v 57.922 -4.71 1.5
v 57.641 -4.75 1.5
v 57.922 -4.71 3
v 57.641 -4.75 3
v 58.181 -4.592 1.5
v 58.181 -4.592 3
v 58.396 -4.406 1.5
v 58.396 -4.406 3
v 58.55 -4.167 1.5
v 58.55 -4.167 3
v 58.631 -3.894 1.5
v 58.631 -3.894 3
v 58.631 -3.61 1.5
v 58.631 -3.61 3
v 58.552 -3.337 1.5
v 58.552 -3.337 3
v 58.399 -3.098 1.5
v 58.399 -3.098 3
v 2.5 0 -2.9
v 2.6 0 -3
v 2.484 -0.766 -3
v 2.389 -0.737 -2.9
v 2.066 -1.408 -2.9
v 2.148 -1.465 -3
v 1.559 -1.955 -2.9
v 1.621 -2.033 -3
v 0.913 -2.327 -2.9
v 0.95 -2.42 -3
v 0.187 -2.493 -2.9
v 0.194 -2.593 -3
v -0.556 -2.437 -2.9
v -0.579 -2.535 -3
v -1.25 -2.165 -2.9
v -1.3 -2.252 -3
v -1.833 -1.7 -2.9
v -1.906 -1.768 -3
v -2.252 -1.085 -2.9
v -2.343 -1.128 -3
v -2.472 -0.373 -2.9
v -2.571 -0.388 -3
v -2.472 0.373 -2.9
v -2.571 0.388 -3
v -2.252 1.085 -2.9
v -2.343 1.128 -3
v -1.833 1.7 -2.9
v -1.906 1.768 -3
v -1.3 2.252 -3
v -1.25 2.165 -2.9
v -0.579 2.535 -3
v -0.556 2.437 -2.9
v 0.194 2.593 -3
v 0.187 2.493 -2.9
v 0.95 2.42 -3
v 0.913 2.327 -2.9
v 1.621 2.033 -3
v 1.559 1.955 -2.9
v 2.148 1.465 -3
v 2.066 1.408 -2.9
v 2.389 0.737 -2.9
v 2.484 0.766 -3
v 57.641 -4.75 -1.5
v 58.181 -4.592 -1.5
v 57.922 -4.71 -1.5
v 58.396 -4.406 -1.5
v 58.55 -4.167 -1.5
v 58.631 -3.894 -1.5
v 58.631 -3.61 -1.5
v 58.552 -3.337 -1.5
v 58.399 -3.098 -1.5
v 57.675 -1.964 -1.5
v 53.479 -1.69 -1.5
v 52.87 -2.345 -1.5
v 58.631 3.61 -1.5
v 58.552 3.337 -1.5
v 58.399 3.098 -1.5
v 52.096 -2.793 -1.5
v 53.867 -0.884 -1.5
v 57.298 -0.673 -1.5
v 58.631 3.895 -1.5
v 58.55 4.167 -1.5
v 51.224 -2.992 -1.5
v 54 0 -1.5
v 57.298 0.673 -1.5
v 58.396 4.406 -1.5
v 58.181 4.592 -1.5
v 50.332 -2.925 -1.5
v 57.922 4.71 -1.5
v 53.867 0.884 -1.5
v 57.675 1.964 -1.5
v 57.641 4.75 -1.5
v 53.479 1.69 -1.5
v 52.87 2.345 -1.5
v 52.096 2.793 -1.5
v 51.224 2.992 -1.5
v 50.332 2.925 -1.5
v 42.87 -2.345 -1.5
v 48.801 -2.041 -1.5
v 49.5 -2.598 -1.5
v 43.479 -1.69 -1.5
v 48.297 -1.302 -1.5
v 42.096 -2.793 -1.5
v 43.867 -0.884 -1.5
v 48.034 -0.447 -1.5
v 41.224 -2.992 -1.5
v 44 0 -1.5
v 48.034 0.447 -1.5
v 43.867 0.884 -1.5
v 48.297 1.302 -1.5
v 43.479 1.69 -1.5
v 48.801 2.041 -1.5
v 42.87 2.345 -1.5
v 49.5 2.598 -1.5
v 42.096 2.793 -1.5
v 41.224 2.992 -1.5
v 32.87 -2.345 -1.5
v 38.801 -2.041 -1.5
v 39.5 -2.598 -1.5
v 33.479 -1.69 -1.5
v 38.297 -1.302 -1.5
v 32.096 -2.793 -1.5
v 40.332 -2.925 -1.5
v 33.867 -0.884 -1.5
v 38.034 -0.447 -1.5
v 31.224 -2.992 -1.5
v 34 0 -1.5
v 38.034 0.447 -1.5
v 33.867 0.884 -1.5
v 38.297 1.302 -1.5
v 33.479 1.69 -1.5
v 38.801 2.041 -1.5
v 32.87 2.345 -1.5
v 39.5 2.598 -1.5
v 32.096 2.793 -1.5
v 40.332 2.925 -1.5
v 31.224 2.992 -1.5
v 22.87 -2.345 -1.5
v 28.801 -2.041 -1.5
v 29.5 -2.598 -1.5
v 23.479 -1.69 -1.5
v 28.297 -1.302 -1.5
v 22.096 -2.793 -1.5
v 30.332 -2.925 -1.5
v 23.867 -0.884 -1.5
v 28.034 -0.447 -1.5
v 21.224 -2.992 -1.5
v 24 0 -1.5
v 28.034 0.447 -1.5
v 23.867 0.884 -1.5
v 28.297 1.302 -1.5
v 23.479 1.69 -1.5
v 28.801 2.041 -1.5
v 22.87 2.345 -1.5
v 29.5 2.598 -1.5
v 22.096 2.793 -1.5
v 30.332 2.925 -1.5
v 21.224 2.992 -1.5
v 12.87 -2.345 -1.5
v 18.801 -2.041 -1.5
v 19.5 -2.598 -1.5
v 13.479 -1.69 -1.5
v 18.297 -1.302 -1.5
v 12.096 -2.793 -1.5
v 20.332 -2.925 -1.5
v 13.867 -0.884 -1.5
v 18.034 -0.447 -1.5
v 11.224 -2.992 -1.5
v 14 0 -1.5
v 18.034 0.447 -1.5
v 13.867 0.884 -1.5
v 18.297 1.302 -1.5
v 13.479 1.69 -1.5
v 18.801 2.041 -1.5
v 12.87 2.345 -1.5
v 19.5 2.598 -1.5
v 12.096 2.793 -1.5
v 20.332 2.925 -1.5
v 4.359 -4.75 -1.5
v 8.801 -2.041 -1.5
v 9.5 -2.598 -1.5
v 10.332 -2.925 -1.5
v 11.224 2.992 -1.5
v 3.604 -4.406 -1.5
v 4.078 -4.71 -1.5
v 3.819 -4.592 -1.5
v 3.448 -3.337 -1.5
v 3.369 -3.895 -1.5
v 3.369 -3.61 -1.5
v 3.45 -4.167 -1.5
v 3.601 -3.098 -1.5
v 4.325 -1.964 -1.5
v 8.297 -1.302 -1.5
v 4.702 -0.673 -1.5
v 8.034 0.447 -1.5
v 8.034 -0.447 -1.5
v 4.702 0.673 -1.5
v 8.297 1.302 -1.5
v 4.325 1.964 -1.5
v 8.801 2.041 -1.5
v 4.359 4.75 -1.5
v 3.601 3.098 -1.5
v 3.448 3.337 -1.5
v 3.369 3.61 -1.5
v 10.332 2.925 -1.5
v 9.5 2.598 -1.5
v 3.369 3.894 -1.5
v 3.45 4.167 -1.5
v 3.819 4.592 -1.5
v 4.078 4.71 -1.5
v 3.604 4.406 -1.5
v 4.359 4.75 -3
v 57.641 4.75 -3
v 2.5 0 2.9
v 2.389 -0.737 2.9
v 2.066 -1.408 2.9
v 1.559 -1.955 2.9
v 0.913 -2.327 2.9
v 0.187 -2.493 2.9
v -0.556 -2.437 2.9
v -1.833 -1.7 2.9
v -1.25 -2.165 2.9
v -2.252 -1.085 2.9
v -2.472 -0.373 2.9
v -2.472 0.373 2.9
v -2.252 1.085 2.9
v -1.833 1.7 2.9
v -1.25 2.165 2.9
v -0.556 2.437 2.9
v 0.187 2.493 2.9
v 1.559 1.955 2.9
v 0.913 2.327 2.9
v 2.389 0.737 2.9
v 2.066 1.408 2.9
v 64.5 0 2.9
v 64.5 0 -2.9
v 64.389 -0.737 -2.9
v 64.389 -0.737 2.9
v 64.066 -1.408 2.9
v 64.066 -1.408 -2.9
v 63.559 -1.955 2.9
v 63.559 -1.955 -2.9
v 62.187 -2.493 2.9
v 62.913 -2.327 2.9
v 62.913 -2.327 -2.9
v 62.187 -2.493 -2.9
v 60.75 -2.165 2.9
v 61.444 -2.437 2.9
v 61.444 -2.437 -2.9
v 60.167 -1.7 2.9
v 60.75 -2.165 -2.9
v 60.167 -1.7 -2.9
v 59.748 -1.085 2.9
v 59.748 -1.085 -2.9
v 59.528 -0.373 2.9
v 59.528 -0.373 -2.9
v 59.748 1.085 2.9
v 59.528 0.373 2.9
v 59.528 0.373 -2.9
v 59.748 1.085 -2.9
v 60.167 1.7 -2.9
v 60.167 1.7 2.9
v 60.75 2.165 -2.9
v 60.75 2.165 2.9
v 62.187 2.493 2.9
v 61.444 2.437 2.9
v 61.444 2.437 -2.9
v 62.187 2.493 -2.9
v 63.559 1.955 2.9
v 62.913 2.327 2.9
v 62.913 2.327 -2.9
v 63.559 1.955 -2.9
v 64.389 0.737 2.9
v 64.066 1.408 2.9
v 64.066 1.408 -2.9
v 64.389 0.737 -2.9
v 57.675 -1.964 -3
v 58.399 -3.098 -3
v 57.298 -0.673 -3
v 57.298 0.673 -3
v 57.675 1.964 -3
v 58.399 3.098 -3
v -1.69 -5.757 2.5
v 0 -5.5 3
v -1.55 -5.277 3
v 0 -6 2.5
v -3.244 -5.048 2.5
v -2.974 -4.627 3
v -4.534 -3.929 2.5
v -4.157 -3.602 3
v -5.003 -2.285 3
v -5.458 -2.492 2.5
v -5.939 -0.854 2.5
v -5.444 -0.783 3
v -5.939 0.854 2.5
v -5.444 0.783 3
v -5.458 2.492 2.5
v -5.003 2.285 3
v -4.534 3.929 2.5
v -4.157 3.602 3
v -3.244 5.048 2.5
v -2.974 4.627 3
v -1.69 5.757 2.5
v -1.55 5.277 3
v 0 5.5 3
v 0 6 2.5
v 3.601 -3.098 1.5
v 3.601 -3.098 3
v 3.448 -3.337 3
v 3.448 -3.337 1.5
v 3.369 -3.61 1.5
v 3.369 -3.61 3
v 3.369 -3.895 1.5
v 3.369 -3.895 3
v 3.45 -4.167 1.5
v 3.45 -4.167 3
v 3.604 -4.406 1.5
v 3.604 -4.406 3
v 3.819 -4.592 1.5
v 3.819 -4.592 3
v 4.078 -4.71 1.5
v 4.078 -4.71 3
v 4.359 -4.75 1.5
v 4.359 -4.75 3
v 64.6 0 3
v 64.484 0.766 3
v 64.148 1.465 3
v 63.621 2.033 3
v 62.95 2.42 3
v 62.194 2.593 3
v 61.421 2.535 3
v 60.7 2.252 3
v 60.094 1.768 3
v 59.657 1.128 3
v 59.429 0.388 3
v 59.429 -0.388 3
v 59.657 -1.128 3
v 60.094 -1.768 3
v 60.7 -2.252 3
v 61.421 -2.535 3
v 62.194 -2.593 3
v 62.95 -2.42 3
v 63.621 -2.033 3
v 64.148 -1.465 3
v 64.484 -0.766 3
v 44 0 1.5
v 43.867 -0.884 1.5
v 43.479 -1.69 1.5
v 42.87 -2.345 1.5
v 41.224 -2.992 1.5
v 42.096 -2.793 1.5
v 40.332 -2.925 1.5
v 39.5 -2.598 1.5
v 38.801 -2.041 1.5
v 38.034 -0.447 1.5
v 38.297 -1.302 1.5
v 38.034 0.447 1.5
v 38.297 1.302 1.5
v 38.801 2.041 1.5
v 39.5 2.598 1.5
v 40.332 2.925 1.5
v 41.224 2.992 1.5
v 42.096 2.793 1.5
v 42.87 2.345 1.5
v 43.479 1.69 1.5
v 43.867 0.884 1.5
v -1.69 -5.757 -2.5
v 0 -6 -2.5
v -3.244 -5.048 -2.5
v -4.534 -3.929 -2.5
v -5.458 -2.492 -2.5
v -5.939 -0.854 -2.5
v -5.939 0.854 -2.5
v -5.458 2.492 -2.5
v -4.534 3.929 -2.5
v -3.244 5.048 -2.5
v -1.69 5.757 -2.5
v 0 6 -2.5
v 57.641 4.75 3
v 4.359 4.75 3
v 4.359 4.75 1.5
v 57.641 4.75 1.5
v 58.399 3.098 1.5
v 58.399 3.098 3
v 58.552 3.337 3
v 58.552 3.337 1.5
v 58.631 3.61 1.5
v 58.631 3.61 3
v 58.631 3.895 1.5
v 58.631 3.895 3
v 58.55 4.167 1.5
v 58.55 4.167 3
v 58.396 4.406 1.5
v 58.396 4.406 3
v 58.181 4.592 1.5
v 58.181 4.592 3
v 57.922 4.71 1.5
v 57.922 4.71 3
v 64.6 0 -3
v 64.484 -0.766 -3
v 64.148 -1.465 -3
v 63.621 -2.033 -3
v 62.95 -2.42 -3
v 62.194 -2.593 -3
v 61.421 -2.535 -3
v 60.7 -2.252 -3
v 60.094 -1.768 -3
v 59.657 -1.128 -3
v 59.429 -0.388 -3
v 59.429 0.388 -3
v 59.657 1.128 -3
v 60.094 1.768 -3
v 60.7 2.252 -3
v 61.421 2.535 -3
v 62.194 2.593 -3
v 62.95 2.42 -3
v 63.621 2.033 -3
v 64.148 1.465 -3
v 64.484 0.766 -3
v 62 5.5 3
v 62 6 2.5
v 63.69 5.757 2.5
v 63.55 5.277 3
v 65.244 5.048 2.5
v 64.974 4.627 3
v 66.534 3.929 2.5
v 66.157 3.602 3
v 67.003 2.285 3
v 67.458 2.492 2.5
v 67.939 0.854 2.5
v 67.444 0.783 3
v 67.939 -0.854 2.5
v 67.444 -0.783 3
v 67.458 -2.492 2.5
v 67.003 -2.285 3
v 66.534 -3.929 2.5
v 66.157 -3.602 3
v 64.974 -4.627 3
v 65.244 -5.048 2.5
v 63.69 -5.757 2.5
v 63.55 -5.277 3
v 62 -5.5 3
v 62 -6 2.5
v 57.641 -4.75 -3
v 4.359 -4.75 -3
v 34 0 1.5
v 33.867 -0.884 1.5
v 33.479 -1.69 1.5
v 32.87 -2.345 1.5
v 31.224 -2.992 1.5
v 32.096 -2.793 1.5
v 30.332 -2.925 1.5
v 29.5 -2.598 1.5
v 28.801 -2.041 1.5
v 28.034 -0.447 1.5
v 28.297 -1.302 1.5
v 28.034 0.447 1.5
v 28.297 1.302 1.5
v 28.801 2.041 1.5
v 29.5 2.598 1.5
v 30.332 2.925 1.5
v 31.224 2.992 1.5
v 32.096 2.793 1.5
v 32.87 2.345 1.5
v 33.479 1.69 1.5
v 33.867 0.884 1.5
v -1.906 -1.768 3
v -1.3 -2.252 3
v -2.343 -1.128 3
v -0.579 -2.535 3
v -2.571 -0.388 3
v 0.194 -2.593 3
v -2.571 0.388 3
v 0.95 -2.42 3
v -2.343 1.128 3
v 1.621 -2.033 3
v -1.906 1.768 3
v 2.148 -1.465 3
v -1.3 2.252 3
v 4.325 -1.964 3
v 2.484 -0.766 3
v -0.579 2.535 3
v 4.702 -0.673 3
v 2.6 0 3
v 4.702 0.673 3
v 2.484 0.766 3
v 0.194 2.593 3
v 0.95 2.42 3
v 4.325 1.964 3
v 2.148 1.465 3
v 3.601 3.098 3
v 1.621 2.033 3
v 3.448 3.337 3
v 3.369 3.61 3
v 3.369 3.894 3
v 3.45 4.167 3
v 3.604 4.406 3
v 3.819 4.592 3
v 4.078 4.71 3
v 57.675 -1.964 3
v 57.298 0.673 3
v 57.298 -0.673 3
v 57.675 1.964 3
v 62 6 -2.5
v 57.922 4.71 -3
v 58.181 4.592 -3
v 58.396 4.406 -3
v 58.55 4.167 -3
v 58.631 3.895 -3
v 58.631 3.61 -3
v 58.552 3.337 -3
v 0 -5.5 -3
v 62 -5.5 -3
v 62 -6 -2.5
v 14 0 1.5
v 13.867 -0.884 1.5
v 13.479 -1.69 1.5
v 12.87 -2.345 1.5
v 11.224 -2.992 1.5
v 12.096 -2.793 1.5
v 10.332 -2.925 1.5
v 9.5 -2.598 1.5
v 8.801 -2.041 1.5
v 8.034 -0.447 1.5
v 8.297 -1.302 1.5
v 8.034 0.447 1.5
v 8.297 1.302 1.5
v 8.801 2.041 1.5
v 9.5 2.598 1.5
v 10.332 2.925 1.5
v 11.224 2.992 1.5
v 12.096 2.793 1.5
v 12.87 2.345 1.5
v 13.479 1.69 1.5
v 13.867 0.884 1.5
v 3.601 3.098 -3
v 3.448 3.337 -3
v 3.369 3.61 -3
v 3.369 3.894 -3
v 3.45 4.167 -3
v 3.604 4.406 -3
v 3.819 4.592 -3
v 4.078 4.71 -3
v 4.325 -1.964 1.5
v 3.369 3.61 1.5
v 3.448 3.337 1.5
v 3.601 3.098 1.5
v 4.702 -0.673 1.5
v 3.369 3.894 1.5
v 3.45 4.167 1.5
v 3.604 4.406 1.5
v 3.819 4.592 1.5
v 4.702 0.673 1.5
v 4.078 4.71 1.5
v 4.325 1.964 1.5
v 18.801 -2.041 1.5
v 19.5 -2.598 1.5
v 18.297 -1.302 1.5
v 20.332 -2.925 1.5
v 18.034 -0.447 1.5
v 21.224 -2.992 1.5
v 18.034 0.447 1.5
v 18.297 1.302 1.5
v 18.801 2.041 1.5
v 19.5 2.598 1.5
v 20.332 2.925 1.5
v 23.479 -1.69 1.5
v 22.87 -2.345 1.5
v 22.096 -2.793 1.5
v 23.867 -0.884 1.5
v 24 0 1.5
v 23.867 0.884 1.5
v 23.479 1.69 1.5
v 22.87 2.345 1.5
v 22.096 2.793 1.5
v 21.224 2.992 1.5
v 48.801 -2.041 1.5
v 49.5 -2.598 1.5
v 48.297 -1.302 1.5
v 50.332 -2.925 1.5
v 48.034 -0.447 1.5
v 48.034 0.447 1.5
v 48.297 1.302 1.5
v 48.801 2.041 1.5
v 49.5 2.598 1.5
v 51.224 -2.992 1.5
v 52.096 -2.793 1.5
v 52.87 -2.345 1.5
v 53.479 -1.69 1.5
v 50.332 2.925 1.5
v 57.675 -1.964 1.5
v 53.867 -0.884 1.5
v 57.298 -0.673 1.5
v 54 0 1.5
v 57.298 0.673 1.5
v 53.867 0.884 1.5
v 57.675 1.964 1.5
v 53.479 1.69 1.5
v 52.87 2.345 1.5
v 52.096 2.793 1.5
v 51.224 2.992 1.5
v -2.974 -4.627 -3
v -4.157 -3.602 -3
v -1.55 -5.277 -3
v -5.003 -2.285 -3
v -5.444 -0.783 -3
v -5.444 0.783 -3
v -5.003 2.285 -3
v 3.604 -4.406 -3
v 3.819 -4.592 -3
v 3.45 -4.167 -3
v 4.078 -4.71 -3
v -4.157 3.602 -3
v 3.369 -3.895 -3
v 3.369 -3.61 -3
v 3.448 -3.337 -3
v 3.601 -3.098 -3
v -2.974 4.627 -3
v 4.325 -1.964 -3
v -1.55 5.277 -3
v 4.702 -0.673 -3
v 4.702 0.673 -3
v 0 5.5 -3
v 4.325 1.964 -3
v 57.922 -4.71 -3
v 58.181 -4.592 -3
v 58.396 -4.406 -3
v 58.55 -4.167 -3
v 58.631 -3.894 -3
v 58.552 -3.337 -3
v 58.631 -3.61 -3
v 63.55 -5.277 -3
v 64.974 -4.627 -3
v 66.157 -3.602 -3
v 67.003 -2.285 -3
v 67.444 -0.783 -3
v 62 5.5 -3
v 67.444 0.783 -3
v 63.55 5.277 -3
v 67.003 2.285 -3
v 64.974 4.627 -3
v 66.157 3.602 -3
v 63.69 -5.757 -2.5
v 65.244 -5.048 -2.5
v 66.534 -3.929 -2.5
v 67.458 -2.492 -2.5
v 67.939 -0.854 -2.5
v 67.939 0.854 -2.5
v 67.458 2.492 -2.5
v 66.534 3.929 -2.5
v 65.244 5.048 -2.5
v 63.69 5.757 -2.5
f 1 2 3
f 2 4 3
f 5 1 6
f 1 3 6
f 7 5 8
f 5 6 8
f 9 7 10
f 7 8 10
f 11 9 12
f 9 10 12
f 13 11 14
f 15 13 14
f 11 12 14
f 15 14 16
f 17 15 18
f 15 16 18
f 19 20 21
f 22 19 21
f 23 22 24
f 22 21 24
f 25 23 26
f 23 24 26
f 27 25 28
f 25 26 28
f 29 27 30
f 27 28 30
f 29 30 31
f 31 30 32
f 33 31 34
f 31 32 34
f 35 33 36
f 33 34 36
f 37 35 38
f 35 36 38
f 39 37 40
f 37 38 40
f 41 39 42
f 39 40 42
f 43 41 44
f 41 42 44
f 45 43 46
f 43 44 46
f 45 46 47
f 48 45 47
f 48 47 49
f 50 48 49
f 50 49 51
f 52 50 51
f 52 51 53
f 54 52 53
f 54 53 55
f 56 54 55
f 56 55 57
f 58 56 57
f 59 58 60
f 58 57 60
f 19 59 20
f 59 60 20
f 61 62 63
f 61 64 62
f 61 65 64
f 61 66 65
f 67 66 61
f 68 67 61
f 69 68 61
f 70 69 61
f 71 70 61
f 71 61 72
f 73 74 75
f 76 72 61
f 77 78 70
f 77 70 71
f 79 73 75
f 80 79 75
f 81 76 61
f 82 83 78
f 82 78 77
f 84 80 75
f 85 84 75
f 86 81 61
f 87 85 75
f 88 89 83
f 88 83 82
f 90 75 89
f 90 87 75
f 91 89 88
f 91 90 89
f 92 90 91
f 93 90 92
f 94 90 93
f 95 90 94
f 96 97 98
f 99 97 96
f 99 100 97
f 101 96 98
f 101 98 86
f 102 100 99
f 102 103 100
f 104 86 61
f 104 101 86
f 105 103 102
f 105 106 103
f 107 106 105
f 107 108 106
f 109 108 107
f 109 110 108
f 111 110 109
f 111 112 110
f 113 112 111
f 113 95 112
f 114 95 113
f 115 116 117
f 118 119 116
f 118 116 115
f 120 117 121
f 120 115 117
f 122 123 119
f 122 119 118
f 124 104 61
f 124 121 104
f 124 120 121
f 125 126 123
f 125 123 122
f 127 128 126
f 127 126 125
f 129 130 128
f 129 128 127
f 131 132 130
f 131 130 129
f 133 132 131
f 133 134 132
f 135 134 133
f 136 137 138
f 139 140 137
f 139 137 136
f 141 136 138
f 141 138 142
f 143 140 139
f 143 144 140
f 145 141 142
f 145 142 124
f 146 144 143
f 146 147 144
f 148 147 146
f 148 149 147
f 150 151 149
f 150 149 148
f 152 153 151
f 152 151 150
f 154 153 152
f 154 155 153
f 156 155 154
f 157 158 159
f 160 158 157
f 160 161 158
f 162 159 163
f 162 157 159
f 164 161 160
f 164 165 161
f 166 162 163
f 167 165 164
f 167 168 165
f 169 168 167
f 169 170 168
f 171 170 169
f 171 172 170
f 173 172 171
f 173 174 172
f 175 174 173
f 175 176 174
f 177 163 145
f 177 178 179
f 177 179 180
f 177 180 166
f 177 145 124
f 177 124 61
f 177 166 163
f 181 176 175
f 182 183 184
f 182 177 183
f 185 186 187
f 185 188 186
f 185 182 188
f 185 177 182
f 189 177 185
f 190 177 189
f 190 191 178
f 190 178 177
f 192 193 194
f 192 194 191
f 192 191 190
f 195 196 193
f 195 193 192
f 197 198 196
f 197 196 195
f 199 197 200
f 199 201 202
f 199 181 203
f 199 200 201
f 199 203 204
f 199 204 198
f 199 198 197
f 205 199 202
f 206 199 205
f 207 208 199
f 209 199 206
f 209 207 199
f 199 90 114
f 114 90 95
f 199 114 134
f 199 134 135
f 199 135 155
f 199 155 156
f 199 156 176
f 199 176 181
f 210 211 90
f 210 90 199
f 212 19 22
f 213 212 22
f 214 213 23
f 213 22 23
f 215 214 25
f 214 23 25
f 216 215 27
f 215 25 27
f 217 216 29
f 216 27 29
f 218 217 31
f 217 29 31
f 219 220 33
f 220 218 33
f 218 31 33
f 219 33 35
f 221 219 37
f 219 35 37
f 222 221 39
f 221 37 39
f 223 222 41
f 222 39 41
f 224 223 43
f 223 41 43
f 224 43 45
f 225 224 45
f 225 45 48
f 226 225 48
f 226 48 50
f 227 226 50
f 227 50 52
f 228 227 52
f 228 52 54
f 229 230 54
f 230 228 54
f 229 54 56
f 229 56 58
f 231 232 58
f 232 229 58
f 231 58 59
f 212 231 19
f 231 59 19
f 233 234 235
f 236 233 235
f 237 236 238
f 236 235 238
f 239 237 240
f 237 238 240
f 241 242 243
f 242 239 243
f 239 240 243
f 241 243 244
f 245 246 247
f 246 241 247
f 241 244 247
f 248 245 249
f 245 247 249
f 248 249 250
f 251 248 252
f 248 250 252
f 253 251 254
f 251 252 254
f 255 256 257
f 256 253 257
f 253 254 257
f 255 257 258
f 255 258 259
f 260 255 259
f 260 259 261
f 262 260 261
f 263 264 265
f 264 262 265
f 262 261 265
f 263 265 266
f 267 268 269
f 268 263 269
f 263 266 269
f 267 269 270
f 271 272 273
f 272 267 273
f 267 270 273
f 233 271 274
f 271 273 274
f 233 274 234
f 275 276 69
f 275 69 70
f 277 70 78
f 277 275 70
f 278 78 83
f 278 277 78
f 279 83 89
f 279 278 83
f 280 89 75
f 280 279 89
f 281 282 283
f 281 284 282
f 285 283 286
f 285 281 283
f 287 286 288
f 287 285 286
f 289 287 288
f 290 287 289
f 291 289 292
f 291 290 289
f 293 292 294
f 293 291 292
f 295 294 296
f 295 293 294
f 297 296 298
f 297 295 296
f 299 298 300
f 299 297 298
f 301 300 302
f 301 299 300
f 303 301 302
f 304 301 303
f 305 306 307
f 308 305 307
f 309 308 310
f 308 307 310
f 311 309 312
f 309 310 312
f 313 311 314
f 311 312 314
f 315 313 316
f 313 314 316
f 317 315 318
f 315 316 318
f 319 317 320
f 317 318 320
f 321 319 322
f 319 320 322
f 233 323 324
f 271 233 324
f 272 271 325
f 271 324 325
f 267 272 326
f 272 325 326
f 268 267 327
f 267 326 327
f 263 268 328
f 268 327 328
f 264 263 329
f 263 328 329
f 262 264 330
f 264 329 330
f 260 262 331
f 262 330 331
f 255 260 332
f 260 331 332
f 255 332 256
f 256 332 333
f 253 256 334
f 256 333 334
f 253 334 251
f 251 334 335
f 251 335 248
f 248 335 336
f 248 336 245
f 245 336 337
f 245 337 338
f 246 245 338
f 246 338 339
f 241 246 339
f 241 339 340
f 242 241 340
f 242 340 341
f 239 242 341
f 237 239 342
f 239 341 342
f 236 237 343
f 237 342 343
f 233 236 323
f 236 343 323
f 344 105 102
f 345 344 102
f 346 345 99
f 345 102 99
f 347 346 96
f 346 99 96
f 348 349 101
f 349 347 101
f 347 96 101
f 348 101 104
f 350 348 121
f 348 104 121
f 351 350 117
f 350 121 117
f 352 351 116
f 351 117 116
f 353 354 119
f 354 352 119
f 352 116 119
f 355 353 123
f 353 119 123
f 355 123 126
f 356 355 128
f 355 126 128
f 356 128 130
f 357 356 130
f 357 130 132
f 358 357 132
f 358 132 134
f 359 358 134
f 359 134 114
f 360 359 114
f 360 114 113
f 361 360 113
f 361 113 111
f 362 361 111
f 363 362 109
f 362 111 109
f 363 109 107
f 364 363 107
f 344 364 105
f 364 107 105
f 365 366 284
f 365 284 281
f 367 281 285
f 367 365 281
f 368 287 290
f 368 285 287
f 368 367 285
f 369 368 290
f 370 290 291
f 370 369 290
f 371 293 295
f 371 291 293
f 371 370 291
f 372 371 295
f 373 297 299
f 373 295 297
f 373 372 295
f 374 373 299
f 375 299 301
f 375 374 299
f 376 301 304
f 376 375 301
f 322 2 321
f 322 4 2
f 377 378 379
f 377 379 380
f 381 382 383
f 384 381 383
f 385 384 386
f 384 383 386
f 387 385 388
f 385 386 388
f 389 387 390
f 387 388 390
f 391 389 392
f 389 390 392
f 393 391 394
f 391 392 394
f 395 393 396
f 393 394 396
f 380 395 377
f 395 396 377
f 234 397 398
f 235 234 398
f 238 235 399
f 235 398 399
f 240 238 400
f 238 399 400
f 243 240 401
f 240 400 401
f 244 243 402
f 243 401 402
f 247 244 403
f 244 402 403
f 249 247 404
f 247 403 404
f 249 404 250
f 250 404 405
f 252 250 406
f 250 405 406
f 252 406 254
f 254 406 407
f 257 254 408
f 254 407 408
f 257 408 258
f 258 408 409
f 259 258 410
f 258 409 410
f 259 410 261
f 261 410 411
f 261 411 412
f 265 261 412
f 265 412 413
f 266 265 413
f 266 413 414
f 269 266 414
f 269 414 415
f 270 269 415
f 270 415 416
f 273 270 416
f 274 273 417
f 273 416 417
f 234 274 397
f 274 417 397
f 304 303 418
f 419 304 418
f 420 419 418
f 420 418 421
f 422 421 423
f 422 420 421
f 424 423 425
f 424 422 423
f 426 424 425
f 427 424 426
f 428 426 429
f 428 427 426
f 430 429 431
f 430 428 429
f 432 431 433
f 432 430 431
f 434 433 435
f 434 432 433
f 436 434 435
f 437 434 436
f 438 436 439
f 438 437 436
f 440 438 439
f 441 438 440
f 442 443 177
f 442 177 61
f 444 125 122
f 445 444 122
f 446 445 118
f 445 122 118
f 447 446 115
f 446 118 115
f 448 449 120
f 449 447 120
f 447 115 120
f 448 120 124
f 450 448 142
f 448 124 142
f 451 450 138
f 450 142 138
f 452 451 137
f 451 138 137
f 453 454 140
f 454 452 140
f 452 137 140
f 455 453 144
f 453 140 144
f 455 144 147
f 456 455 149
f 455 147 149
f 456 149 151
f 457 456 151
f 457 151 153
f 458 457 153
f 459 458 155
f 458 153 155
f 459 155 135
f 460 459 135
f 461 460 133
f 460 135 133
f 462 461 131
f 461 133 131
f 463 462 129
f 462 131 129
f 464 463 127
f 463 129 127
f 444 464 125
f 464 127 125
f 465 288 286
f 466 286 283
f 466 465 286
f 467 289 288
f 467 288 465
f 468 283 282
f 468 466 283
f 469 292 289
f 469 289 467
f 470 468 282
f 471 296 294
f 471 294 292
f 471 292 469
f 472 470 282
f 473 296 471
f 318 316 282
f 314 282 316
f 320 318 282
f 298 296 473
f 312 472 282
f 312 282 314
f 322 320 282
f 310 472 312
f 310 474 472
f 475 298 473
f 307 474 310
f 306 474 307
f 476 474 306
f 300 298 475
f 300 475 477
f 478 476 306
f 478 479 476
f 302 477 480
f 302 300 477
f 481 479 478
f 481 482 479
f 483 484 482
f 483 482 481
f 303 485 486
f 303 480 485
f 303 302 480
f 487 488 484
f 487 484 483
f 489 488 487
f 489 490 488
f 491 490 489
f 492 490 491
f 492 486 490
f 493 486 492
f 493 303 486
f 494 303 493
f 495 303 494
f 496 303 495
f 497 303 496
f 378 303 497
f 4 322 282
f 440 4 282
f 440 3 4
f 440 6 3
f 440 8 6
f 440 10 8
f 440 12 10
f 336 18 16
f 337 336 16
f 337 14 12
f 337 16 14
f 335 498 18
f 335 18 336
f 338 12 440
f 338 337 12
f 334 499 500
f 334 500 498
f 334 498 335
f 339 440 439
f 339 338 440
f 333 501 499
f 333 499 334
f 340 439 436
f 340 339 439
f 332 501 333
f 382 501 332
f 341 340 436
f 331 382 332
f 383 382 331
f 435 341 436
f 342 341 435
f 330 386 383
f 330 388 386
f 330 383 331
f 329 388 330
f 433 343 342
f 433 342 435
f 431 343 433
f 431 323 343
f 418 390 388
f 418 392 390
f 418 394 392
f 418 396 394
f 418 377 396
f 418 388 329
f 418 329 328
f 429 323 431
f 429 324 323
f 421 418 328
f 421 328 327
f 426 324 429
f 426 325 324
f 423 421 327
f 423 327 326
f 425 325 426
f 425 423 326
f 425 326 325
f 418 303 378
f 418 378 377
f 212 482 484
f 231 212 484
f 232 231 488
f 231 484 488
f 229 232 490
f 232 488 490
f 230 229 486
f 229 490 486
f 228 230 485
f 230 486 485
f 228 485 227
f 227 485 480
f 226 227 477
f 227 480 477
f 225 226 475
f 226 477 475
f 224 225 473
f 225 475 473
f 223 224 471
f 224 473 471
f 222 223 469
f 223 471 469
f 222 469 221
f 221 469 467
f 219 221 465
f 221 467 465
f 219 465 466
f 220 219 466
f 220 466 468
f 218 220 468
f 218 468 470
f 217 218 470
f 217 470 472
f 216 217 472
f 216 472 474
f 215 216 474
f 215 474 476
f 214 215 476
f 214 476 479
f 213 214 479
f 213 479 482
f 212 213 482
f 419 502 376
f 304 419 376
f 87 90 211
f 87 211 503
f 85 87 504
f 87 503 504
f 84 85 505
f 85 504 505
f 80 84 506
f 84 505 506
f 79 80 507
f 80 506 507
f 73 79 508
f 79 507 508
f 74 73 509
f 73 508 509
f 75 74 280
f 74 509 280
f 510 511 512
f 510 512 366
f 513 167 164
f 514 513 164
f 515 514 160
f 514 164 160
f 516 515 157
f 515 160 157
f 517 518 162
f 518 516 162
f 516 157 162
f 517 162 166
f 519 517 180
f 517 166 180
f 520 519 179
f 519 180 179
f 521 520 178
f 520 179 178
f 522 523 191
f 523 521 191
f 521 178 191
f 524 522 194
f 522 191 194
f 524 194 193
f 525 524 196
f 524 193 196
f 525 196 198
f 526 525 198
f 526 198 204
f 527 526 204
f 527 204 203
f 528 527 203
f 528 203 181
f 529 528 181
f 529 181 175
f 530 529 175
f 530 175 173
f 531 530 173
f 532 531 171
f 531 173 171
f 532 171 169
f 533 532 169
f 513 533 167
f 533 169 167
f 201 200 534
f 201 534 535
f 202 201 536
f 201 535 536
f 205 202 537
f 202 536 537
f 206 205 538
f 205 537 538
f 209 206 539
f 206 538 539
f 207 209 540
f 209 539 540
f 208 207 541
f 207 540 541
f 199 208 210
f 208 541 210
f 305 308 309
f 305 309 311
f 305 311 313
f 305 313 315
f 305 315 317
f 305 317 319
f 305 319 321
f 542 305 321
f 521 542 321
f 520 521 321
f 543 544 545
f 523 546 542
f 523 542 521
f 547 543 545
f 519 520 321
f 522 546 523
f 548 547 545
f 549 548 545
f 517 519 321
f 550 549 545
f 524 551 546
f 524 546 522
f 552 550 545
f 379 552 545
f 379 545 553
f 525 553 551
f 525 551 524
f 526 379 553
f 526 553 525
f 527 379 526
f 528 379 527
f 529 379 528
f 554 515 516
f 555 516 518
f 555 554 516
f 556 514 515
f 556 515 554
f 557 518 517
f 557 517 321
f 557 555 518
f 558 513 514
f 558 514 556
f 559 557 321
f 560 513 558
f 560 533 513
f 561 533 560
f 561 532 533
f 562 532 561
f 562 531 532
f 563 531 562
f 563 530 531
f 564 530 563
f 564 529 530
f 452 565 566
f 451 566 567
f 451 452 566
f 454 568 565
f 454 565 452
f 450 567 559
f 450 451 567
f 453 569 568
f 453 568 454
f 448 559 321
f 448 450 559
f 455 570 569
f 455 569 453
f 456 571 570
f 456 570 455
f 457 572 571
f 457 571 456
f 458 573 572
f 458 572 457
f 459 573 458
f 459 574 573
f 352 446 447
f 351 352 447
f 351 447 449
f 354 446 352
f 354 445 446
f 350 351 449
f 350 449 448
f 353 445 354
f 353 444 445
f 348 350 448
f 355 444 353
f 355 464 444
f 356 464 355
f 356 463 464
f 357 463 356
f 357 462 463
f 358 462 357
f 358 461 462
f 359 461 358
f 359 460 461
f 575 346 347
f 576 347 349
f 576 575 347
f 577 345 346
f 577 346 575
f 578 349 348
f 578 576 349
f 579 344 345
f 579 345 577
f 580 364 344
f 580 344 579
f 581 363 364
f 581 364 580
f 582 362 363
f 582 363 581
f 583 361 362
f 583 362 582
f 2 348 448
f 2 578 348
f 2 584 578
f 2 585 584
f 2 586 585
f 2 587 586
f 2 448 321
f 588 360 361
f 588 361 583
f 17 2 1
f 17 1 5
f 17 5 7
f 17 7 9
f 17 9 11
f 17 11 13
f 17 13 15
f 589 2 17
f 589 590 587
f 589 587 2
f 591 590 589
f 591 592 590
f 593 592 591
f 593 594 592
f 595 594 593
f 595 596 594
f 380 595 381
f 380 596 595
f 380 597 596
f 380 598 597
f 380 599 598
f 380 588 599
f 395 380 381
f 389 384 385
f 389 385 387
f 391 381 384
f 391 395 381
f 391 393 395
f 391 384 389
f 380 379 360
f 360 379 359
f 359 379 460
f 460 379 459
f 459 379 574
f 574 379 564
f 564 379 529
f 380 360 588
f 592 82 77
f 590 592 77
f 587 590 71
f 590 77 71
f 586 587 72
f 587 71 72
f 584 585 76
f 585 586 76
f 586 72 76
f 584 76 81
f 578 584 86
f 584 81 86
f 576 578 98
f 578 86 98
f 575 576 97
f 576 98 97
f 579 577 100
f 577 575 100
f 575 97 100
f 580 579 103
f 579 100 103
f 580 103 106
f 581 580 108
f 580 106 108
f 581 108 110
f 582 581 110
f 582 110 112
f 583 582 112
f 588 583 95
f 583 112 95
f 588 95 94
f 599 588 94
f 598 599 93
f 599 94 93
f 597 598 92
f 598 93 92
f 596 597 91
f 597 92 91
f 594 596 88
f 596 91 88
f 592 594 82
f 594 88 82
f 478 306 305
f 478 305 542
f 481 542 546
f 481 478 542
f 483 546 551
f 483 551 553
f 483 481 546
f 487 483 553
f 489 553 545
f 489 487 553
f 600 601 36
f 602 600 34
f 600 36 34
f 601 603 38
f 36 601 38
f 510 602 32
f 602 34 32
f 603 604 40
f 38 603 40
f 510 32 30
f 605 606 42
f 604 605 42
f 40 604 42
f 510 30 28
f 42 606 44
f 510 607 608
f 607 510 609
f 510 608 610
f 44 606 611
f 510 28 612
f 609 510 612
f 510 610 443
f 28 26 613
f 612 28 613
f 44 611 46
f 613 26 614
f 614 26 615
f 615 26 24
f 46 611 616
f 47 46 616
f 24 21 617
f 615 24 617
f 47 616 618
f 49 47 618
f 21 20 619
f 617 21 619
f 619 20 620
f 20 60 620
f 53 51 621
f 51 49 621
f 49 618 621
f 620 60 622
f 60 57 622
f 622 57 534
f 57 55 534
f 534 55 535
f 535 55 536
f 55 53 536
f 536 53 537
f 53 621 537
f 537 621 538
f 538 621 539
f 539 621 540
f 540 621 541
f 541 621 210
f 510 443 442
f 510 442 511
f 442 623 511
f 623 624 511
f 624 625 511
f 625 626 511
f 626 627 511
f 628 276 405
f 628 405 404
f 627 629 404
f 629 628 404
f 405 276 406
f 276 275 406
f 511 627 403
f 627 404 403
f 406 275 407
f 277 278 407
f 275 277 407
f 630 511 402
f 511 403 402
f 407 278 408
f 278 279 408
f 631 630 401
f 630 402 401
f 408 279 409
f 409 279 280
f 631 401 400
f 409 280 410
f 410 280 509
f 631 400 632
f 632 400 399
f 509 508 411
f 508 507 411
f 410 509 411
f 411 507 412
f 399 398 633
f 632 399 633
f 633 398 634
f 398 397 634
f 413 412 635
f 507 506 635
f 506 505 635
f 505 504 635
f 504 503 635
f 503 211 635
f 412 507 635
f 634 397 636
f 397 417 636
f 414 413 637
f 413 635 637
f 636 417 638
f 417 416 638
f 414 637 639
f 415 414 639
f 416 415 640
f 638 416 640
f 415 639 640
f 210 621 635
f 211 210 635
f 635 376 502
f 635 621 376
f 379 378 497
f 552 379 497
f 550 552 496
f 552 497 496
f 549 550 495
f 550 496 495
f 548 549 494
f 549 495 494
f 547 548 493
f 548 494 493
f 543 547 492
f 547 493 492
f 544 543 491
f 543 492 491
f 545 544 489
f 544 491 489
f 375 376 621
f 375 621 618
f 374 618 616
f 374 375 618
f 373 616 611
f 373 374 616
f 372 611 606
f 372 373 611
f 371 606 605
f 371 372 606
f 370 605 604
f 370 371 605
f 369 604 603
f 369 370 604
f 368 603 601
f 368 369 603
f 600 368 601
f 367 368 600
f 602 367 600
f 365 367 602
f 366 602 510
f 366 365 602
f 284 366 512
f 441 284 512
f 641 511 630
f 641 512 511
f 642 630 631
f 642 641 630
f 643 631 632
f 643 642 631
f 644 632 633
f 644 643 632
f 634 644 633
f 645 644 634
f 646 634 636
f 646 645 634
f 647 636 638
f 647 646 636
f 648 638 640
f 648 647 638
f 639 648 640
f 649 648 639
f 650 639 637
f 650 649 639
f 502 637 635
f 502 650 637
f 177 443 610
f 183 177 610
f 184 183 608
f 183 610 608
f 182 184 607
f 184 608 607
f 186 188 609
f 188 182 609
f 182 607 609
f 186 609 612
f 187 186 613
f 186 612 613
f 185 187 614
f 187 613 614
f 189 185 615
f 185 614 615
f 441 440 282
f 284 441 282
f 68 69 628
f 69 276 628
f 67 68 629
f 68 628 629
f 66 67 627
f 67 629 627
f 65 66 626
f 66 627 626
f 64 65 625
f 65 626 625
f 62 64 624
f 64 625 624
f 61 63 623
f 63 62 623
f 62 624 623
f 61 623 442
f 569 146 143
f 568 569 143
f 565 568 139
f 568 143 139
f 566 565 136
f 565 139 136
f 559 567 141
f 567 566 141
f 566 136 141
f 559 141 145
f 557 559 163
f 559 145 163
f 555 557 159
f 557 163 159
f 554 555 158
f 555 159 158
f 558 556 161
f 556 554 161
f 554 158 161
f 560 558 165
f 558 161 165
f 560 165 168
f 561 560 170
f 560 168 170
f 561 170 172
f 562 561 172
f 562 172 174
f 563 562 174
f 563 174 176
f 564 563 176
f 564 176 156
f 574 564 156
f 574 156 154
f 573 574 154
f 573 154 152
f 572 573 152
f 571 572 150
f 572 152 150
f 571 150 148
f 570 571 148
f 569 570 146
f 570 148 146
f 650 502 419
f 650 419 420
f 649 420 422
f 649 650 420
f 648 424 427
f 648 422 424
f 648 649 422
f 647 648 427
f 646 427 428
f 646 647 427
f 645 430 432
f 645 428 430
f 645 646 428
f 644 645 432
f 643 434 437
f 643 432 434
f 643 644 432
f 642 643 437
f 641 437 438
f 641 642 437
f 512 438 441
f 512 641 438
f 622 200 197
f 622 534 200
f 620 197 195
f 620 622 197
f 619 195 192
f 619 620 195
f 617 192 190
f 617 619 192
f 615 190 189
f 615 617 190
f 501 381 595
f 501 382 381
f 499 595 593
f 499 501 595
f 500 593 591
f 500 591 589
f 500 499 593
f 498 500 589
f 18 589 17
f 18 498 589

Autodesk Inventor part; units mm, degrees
ref_plane "YZ Plane" through (0, 0, 0) normal (1, 0, 0) x (0, 1, 0)
ref_plane "XZ Plane" through (0, 0, 0) normal (0, 1, 0) x (-1, 0, 0)
ref_plane "XY Plane" through (0, 0, 0) normal (0, 0, 1) x (1, 0, 0)
sketch "Sketch1" plane through (0, 0, 0) normal (0, 0, 1) x (1, 0, 0)
  line L0 (0, 0) -> (62, 0) construction
  line L1 (0, -6) -> (62, -6)
  line L2 (62, 6) -> (0, 6)
  arc A0 (0, 6) -> (0, -6) centre (0, 0) ccw
  arc A1 (62, -6) -> (62, 6) centre (62, 0) ccw
  circle A2 centre (0, 0) radius 2.5
  circle A3 centre (62, 0) radius 2.5
  circle A4 centre (11, 0) radius 3
  circle A5 centre (21, 0) radius 3
  circle A6 centre (31, 0) radius 3
  circle A7 centre (41, 0) radius 3
  circle A8 centre (51, 0) radius 3
  point P0 (31, 0)
  dimension "d0" = 6
  dimension "d1" = 5
  dimension "d2" = 62
  dimension "d3" = 6
  dimension "d4" = 11
  dimension "d7" = 10
extrude "Extrusion1" add sketch "Sketch1" along normal mid plane 6
sketch "Sketch2" plane through (0, 0, 3) normal (0, 0, 1) x (1, 0, 0)
  arc A0 (0, 6) -> (0, -6) centre (0, 0) ccw projected
  circle A1 centre (11, 0) radius 3 projected
  circle A2 centre (21, 0) radius 3 projected
  circle A3 centre (31, 0) radius 3 projected
  circle A4 centre (41, 0) radius 3 projected
  circle A5 centre (51, 0) radius 3 projected
  line L0 (4.3589, 4.75) -> (57.6411, 4.75)
  line L1 (57.6411, -4.75) -> (4.3589, -4.75)
  arc A6 (3.6008, -3.0978) -> (3.6008, 3.0978) centre (0, 0) ccw
  arc A7 (4.3589, 4.75) -> (3.6008, 3.0978) centre (4.3589, 3.75) ccw
  arc A8 (3.6008, -3.0978) -> (4.3589, -4.75) centre (4.3589, -3.75) ccw
  line L2 (31, 3) -> (31, -3) construction
  arc A9 (58.3992, 3.0978) -> (58.3992, -3.0978) centre (62, 0) ccw
  arc A10 (57.6411, -4.75) -> (58.3992, -3.0978) centre (57.6411, -3.75) ccw
  arc A11 (58.3992, 3.0978) -> (57.6411, 4.75) centre (57.6411, 3.75) ccw
  point P0 (0, 4.75)
  point P1 (0, -4.75)
  dimension "d14" = 1
  dimension "d15" = 4.75
extrude "Extrusion2" cut sketch "Sketch2" against normal blind 1.5
mirror "Mirror1" about plane through (0, 0, 0) normal (0, 0, 1) of "Extrusion2"
chamfer "Chamfer1" distance 0.5 angle 45 8 edges at (31, 6, 3) (-6, 0, 3) (31, -6, 3) (68, 0, 3) (31, 6, -3) (68, 0, -3) (31, -6, -3) (-6, 0, -3)
chamfer "Chamfer2" distance 0.1 angle 45 4 edges at (-2.5, 0, 3) (59.5, 0, 3) (59.5, 0, -3) (-2.5, 0, -3)
ref_plane "Work Plane1" through (0, 0, 0) normal (0, 0, 1) x (1, 0, 0)
properties part number "Crankrod"
